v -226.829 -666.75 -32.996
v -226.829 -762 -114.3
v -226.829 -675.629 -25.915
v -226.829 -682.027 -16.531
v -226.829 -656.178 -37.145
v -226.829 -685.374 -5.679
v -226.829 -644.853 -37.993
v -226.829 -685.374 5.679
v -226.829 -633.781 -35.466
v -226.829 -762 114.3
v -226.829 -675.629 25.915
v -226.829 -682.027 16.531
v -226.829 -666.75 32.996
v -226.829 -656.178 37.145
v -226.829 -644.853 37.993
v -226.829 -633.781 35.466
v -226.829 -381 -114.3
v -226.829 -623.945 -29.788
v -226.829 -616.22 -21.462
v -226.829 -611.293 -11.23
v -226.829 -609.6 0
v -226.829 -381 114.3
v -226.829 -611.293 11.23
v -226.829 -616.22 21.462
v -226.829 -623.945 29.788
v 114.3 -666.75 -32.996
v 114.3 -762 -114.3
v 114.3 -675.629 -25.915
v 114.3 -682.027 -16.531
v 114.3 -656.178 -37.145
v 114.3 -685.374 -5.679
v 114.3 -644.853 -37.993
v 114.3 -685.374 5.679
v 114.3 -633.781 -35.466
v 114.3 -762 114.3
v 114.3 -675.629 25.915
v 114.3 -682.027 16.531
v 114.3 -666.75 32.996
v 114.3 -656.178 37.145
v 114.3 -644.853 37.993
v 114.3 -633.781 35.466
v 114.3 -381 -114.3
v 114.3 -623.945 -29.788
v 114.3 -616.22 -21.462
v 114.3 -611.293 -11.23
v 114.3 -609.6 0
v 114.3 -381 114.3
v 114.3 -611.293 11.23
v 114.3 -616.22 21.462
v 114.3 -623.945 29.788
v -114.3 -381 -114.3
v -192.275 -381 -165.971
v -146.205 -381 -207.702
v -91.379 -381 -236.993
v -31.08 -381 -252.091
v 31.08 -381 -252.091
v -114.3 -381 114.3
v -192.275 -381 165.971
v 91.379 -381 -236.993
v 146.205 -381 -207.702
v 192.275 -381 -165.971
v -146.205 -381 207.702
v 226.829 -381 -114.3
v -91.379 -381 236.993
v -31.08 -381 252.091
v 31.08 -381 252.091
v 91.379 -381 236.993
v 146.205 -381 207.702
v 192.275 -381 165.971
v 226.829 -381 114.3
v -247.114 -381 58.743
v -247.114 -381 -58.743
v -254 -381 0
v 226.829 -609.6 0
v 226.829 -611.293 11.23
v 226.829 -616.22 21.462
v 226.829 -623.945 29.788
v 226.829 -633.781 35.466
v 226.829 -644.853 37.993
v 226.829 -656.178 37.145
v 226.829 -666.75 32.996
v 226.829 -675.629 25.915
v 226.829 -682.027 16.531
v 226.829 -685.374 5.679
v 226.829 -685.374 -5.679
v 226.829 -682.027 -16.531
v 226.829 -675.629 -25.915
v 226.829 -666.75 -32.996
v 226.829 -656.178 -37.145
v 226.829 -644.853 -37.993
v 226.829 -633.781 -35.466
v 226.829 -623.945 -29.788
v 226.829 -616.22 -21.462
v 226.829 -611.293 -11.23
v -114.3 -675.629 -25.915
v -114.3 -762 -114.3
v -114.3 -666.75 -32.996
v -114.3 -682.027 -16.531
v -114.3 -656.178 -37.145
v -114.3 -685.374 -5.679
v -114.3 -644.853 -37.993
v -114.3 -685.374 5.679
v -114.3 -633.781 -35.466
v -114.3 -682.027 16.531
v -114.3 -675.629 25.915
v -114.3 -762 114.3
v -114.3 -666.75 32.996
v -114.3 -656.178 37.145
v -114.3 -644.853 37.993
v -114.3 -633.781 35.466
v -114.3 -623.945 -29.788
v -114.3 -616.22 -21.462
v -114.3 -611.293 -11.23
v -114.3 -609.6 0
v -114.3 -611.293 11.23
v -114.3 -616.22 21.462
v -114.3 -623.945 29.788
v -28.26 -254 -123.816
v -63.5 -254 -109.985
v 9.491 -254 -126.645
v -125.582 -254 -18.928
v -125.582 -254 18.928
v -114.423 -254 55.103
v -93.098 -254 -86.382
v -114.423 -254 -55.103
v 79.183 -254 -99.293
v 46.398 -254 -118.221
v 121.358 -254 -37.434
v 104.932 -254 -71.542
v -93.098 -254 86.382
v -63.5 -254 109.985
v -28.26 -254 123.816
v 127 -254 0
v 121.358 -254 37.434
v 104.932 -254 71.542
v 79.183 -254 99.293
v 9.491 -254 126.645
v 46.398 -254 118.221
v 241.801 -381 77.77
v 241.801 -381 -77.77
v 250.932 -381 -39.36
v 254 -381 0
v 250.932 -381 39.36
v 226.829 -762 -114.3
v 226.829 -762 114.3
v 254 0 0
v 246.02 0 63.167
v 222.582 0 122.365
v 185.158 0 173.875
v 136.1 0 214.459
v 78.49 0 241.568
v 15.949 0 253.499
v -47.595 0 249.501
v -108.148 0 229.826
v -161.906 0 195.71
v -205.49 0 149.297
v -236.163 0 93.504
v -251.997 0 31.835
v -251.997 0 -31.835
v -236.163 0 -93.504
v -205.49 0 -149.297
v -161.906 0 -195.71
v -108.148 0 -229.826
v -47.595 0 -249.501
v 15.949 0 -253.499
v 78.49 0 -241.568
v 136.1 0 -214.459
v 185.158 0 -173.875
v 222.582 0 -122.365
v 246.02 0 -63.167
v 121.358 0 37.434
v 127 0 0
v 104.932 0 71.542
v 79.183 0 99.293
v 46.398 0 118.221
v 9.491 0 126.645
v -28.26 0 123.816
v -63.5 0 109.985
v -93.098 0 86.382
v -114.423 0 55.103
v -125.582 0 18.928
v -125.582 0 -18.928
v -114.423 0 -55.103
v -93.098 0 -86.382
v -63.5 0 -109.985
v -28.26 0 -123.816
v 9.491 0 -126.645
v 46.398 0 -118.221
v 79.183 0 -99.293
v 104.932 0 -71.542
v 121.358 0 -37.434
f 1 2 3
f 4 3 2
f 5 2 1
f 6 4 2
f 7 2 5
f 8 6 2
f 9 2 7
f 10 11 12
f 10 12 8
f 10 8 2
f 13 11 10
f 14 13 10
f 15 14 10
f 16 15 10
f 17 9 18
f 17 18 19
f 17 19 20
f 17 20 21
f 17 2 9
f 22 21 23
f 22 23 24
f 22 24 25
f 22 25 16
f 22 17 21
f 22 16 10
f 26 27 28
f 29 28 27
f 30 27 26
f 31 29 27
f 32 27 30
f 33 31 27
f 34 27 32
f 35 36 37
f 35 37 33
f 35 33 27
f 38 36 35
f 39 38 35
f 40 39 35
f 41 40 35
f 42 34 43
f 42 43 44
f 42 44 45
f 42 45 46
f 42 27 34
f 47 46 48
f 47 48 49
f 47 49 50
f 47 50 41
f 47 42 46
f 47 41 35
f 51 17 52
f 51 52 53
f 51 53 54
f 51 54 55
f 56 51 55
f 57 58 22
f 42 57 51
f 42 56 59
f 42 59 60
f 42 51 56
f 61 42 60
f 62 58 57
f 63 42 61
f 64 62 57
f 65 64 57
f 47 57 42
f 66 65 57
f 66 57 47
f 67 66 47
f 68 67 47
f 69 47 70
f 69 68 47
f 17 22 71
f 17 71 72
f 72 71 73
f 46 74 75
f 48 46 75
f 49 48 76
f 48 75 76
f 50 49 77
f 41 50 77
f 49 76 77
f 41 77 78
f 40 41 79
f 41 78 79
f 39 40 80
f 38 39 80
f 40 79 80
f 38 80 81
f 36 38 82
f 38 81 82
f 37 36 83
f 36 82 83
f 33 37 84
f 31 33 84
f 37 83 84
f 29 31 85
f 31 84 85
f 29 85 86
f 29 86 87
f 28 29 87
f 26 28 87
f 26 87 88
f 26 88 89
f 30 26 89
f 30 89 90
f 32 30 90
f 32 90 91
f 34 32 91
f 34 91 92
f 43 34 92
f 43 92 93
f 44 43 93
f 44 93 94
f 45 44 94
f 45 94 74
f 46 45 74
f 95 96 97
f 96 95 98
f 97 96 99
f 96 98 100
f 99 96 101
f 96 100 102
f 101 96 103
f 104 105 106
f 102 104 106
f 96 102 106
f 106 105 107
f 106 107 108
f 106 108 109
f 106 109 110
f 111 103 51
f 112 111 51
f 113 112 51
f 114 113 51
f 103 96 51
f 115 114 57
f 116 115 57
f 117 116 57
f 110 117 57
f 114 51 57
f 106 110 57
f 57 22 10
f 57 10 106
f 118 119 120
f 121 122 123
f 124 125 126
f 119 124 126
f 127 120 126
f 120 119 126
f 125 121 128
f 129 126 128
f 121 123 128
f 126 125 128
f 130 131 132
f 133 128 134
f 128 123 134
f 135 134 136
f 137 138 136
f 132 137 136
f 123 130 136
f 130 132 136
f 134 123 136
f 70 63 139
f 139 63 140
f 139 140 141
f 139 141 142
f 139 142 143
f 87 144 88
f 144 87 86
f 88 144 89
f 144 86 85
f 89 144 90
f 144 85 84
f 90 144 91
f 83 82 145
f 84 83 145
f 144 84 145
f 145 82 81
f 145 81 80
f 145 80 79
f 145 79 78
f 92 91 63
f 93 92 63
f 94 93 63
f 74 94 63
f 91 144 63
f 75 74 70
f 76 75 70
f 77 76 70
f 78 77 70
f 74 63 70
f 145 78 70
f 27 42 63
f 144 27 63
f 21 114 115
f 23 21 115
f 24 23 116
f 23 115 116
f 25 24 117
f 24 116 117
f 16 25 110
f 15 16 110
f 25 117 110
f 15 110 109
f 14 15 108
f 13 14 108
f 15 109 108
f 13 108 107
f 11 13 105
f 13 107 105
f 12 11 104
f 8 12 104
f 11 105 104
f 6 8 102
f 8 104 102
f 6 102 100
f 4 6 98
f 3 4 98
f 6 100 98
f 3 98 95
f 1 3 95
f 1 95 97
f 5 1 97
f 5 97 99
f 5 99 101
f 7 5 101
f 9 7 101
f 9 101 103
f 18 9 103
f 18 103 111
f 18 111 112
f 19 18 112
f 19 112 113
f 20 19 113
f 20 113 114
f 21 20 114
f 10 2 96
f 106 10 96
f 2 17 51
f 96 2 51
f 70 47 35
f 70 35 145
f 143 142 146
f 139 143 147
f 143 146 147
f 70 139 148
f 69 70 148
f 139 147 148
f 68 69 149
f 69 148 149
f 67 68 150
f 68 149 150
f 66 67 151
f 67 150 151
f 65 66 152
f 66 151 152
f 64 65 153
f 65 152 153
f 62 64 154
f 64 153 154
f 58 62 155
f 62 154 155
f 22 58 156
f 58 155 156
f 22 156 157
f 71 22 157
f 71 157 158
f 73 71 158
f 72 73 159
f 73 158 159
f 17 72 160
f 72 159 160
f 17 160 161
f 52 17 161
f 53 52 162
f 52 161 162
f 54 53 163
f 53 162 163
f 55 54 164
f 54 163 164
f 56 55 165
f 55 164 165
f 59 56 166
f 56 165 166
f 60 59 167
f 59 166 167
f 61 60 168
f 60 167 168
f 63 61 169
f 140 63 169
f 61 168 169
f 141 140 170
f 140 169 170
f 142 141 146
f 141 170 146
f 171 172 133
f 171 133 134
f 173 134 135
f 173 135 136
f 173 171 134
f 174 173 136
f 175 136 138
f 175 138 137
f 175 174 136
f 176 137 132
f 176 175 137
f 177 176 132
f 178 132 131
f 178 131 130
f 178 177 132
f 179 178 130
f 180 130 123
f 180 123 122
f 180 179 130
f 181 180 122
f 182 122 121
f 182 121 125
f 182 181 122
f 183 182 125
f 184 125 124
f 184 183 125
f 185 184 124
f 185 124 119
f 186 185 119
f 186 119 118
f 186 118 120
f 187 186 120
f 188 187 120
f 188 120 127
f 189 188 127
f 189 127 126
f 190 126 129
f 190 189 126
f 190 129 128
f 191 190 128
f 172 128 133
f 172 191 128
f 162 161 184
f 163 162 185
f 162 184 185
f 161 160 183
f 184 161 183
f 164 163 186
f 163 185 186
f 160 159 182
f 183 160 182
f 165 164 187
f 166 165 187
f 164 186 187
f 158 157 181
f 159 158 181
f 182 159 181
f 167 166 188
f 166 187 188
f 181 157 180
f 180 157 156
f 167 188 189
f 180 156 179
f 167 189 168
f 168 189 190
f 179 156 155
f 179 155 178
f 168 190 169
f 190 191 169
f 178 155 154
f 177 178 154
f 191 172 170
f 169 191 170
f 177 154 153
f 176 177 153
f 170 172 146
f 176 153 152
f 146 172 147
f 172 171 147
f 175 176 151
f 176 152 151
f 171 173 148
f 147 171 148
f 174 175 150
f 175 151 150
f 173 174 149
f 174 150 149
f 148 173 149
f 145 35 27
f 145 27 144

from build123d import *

# Parameters (mm, degrees)
F0_R     = 254
F0_R_2   = 127
F1_DEPTH = 254
F2_R     = 254
F3_DEPTH = 127
F4_W     = 112.5292529635
F4_H     = 228.6
F5_DEPTH = 381
F6_R     = 38.1
F7_DEPTH = 480.8302529635


with BuildPart() as f1:
    # F0 (on Front) → F1 (new body)
    with BuildSketch(Plane.XZ):
        Circle(F0_R)
        Circle(F0_R_2, mode=Mode.SUBTRACT)
    extrude(amount=F1_DEPTH)

    # F2 (on face) → F3 (join)
    with BuildSketch(Plane.XZ.offset(254)):
        Circle(F2_R)
    extrude(amount=F3_DEPTH)

    # F4 (on face) → F5 (join)
    with BuildSketch(Plane.XZ.offset(381)):
        with Locations((-170.5646264818, 0)):
            Rectangle(F4_W, F4_H)
        with Locations((170.5646264818, 0)):
            Rectangle(F4_W, F4_H)
    extrude(amount=F5_DEPTH)

    # F6 (on face) → F7 (cut, through all)
    with BuildSketch(Plane.YZ.offset(226.8292529635)):
        with Locations((-647.7, 0)):
            Circle(F6_R)
    extrude(amount=-F7_DEPTH, mode=Mode.SUBTRACT)


solid = f1.part
